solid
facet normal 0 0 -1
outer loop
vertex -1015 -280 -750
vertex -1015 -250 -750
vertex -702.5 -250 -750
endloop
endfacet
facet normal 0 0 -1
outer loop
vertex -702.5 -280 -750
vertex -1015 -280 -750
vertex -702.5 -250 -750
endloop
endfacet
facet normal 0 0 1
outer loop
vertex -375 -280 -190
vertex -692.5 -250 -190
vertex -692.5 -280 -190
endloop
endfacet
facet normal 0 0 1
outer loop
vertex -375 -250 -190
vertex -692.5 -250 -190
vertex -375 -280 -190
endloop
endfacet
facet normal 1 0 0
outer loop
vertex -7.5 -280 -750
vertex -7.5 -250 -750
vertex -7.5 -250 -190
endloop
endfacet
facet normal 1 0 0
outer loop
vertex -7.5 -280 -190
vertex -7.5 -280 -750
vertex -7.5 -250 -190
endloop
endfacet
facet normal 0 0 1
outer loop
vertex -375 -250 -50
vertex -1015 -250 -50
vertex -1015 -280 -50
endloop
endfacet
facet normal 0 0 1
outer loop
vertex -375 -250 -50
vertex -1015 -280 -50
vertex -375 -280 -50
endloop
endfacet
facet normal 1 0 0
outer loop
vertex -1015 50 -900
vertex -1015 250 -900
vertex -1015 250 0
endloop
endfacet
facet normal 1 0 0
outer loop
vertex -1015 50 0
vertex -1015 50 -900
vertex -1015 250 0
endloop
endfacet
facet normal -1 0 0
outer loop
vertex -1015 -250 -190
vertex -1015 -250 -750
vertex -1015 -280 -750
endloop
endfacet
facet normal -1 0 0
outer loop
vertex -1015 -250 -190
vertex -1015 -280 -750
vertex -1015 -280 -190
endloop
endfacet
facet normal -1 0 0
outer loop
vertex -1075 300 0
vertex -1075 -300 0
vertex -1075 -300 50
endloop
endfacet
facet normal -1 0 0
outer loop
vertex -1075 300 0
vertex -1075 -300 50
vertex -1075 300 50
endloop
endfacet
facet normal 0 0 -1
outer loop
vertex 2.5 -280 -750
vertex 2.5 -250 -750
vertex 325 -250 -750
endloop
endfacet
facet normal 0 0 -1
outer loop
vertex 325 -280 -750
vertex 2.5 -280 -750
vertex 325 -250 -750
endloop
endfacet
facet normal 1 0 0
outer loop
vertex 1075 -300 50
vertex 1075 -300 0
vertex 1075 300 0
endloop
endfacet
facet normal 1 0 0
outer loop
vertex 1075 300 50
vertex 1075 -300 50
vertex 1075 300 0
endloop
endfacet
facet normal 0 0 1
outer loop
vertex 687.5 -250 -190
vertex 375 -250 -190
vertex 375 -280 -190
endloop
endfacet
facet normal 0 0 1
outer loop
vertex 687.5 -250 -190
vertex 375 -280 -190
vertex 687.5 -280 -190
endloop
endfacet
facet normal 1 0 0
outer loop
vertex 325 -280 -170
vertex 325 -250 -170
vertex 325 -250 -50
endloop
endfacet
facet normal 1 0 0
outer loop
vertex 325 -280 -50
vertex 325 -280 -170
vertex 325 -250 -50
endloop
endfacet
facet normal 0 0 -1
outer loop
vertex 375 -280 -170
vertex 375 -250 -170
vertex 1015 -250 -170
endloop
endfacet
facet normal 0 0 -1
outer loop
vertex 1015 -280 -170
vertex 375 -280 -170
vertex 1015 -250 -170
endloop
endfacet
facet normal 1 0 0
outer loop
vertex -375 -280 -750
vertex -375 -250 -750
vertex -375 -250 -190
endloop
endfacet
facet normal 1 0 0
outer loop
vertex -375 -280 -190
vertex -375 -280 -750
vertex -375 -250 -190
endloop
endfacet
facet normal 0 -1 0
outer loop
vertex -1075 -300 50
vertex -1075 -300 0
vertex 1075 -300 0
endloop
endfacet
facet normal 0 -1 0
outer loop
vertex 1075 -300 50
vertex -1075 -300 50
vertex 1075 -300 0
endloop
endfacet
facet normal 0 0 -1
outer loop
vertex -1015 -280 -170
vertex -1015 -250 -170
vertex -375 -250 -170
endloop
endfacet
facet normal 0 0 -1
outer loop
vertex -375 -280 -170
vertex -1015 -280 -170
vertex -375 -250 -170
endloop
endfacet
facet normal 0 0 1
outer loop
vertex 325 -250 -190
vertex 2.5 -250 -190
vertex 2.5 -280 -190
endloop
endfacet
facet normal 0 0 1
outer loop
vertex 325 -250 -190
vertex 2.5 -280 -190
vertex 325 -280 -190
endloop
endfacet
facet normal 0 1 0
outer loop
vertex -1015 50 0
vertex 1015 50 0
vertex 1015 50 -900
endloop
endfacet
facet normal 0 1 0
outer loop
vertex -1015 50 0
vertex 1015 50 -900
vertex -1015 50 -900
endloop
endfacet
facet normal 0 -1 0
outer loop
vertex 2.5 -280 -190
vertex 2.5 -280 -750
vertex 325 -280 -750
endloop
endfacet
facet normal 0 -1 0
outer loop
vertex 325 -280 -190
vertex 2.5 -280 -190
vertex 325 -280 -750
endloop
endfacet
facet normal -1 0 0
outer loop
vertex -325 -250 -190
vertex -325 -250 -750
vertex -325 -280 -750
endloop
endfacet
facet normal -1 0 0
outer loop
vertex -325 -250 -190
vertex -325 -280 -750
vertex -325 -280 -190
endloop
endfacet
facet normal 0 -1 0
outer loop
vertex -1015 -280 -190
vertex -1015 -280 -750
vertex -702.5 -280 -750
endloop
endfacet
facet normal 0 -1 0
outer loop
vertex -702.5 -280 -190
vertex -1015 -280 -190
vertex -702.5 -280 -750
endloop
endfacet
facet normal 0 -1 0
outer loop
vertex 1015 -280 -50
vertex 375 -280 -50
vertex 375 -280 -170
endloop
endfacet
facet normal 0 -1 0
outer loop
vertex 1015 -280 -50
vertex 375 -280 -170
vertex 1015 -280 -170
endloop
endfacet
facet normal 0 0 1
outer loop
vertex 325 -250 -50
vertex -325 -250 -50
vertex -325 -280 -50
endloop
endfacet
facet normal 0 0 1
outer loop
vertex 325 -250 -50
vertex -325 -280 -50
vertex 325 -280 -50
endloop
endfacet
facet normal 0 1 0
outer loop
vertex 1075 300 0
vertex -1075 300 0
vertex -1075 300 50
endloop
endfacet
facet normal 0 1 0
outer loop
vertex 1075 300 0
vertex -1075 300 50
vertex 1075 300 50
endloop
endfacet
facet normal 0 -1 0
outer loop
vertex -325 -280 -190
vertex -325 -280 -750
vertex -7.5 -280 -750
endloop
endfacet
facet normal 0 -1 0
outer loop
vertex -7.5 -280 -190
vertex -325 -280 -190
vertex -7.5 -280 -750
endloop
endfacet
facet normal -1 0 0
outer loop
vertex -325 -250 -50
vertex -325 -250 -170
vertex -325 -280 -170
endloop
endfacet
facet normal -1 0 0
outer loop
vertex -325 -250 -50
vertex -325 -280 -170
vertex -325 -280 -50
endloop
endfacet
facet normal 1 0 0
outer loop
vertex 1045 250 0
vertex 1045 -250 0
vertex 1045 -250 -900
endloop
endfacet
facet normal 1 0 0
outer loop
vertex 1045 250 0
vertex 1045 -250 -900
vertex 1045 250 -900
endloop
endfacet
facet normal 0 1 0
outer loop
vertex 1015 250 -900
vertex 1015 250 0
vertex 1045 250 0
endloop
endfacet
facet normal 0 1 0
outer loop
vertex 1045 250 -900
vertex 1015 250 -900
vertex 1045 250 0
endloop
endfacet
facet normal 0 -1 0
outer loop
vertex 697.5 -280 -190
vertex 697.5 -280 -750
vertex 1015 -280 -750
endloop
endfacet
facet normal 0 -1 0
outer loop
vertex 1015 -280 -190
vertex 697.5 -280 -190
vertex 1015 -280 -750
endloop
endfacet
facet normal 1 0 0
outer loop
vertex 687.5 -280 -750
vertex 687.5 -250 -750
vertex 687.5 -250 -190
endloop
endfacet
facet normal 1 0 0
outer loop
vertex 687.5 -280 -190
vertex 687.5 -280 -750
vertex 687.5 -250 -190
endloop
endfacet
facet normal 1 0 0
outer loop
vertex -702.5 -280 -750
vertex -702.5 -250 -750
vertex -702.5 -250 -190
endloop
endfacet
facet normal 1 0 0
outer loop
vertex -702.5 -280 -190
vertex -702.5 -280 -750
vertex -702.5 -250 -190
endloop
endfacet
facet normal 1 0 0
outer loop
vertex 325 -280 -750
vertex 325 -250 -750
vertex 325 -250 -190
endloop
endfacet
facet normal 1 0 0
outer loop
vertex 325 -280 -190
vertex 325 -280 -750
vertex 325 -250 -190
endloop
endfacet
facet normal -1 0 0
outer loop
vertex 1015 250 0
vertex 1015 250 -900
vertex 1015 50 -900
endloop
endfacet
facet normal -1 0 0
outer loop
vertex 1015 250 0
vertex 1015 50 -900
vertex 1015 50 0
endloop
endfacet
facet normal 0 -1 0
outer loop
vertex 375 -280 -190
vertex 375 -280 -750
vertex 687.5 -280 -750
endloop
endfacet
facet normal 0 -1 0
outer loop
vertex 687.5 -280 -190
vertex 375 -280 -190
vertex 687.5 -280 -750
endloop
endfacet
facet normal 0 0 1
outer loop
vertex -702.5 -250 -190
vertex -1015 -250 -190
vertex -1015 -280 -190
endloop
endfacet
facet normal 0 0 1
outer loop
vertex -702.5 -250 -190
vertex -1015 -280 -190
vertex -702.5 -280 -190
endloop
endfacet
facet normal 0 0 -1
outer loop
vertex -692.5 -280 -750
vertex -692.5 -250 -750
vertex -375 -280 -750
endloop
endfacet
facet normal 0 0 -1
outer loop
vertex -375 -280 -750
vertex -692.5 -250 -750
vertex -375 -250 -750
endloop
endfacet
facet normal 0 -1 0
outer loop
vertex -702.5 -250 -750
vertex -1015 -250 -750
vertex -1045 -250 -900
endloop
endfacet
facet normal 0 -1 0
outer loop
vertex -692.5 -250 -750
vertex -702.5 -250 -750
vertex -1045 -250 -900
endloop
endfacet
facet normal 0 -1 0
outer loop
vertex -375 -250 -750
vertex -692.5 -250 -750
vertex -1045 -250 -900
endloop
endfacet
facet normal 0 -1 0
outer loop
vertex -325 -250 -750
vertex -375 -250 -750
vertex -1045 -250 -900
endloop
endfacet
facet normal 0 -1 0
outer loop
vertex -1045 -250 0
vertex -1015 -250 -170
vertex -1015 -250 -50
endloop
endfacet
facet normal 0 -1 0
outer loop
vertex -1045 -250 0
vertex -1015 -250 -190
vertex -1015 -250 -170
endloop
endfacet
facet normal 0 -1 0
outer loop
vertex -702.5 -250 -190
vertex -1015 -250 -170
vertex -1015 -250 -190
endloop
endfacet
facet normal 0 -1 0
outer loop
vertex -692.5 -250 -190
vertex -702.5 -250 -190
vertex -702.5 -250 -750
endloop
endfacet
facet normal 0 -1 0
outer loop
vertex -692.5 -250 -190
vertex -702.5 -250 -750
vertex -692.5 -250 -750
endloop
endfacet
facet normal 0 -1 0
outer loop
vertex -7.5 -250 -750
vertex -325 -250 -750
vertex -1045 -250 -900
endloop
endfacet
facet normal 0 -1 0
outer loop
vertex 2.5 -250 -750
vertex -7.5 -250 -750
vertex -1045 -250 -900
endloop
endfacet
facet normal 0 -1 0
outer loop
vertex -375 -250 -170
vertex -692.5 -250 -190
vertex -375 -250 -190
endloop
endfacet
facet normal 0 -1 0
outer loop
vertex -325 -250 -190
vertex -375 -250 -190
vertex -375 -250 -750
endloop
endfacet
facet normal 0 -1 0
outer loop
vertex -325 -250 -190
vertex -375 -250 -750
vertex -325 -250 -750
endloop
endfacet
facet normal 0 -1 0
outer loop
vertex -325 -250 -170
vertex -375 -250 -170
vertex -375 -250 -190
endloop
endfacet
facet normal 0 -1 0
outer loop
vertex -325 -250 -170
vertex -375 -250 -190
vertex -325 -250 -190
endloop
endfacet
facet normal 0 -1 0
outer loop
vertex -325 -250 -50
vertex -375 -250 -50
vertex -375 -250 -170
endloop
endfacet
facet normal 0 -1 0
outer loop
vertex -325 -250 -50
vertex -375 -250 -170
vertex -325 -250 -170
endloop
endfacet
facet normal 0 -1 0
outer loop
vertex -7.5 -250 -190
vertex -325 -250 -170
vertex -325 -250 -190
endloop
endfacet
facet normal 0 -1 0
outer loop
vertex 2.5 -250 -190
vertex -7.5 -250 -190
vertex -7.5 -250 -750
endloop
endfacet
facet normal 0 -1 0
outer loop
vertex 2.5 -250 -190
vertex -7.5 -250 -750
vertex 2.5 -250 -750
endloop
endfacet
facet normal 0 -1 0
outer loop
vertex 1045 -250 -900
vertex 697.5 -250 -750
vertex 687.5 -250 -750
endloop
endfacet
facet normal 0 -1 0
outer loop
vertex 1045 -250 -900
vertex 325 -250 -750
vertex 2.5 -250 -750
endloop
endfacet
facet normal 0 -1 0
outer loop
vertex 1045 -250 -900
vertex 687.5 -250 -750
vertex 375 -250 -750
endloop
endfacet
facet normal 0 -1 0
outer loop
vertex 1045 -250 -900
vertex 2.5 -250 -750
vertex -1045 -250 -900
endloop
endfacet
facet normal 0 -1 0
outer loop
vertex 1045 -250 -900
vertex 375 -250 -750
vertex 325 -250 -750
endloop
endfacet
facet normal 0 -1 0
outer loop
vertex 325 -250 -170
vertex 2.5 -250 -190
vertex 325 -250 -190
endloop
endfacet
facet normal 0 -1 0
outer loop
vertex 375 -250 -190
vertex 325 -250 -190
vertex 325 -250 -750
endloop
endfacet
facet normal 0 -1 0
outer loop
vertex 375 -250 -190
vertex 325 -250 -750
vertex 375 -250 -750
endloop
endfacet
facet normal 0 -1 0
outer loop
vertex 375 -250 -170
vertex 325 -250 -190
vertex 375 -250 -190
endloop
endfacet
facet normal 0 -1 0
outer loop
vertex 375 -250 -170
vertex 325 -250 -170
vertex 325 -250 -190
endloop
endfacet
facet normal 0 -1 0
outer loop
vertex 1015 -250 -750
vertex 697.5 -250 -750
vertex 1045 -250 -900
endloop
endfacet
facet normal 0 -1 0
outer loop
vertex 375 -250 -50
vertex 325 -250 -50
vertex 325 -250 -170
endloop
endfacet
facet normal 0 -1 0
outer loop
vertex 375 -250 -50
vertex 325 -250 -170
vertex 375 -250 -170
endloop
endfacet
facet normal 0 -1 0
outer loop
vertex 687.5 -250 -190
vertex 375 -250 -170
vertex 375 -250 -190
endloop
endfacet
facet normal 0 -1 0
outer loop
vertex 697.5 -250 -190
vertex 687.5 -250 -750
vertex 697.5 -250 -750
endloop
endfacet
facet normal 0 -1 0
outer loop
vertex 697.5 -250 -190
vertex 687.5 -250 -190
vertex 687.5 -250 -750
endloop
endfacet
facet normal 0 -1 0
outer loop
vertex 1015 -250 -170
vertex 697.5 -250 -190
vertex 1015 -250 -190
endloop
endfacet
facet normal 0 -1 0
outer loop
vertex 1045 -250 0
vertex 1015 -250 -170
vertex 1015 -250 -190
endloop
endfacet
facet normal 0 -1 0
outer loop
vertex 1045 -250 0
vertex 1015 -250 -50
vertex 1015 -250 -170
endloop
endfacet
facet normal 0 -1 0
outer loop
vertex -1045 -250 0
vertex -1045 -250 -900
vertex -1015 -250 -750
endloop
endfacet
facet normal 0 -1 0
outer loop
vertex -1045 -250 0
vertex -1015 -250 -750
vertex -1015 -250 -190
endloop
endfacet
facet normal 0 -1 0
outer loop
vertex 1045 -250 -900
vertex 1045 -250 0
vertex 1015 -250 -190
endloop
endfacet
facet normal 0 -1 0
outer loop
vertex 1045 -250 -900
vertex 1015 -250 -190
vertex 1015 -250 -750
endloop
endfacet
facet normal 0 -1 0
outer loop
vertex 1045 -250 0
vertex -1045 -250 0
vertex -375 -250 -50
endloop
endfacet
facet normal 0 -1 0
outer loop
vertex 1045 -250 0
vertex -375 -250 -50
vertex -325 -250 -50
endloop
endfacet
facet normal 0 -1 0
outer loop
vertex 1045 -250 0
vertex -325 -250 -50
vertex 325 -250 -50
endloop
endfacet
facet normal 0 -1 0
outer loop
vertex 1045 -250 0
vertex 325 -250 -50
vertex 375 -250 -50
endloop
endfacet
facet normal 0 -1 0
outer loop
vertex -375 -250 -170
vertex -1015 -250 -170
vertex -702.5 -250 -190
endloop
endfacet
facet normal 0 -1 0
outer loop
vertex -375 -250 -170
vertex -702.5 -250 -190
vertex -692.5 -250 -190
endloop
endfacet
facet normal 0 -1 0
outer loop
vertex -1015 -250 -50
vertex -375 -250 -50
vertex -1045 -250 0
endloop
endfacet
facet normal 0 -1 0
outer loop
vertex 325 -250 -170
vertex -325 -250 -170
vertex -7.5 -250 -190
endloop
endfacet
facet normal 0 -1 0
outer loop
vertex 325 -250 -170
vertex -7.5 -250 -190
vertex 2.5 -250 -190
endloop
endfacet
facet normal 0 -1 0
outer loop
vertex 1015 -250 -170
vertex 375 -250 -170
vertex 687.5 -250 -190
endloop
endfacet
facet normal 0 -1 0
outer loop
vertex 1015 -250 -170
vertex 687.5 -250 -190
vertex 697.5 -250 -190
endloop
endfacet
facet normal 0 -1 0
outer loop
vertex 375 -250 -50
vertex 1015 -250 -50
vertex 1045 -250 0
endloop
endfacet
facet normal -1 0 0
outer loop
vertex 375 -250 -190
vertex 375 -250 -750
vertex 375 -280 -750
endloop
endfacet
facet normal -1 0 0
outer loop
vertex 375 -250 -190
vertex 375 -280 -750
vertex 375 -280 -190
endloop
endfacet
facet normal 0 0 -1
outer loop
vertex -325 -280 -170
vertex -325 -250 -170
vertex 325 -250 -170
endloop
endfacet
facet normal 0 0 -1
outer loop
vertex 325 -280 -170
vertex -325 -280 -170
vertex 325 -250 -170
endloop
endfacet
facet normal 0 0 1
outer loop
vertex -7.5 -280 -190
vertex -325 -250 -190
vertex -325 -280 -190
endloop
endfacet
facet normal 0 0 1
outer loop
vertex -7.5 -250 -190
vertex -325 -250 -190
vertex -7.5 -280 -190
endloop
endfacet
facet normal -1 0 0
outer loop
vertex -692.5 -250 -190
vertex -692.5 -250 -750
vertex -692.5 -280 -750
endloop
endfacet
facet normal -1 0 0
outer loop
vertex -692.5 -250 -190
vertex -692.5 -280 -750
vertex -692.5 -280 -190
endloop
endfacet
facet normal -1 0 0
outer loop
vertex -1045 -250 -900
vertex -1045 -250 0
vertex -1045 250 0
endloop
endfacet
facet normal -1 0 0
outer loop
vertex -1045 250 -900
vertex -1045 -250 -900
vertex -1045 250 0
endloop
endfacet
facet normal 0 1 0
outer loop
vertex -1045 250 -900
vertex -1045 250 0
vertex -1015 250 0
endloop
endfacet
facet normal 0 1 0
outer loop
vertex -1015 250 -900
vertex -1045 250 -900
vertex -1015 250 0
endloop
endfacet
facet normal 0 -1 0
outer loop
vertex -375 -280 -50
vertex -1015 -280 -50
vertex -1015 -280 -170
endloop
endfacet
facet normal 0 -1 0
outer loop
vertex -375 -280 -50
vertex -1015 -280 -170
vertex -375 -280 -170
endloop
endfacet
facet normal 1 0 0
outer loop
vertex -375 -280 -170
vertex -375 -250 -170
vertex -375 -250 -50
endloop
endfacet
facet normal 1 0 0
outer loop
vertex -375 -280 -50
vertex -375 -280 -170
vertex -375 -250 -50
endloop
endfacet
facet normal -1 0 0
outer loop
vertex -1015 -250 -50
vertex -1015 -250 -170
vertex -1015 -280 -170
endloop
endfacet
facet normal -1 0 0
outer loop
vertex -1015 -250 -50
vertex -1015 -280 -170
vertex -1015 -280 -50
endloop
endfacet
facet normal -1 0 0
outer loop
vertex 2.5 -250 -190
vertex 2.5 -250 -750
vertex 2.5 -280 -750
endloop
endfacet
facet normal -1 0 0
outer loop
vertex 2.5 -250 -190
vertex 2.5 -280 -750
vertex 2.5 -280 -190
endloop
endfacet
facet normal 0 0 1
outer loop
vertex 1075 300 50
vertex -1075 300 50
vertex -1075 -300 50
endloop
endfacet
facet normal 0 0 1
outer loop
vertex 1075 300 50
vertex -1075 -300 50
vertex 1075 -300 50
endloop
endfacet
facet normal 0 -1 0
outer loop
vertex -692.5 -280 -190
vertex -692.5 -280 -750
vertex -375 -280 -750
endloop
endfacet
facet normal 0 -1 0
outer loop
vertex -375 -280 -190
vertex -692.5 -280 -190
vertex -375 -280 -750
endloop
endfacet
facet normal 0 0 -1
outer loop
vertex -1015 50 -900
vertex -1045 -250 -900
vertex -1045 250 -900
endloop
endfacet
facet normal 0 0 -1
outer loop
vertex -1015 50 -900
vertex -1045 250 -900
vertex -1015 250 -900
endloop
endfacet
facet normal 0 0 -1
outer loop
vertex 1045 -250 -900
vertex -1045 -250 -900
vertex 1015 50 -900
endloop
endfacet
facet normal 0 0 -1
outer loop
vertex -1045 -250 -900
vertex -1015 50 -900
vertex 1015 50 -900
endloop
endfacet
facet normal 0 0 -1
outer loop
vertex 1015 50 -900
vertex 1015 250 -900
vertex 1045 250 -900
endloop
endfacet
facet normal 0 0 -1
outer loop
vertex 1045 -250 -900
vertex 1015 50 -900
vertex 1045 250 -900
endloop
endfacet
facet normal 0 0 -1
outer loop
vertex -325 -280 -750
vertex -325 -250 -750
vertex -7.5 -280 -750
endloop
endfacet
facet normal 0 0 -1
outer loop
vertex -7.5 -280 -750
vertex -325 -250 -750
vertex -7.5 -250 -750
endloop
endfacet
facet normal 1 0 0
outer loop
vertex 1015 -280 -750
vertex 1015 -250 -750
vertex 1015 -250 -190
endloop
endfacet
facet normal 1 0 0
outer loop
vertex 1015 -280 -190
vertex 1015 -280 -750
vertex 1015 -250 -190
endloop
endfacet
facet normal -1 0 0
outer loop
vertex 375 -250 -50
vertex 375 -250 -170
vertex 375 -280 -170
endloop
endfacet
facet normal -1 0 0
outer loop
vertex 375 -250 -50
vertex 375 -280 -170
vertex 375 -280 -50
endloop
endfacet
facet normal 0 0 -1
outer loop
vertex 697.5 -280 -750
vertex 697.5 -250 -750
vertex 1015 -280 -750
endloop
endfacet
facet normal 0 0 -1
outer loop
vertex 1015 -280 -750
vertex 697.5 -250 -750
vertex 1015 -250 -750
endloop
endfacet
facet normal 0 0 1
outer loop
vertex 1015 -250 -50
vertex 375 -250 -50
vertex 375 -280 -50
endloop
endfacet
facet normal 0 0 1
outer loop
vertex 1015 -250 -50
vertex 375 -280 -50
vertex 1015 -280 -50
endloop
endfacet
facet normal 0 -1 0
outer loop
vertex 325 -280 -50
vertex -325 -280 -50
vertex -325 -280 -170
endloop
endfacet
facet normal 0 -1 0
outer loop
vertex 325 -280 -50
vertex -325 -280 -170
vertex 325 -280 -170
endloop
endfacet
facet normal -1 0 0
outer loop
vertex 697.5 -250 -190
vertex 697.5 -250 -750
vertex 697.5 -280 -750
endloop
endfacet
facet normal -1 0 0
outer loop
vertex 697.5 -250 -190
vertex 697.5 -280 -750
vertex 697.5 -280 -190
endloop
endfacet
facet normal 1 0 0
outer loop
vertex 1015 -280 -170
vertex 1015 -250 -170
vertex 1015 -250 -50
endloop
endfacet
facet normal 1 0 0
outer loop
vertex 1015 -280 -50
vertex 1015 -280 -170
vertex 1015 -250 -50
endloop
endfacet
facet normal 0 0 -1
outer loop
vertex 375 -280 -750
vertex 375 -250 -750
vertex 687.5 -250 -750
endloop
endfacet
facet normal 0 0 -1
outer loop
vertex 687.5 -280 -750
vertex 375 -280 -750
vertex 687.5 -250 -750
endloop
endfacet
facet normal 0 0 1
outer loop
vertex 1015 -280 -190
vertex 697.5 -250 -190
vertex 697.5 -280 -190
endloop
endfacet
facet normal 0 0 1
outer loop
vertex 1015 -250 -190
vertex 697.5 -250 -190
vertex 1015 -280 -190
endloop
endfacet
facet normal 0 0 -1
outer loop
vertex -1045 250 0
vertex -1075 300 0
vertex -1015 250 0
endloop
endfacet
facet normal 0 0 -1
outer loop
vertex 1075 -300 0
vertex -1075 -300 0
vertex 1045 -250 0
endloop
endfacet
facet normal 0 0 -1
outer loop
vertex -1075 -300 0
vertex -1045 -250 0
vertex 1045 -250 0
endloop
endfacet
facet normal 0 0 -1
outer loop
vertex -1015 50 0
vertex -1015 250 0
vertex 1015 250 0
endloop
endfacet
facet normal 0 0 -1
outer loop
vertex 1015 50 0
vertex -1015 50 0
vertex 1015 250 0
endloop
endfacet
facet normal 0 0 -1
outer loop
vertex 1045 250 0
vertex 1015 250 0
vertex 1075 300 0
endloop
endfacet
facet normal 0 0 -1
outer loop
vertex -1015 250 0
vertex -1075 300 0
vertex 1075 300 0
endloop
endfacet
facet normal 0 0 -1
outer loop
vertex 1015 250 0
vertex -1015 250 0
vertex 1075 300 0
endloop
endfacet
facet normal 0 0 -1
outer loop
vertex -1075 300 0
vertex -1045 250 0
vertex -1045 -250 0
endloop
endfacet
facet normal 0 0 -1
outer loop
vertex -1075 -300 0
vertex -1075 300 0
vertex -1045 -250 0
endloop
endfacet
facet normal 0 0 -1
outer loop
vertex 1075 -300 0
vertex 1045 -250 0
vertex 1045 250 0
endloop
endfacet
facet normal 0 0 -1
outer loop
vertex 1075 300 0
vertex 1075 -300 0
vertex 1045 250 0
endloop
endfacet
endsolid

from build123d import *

# Parameters (mm, degrees)
F0_W     = 2150
F0_H     = 600
F1_DEPTH = 50
F2_W     = 2090
F2_H     = 500
F3_DEPTH = 900
F4_W     = 640
F4_H     = 120
F4_W_2   = 650
F4_W_3   = 312.5
F4_H_2   = 560
F4_W_4   = 317.5
F4_W_5   = 322.5
F5_DEPTH = 30
F6_W     = 2030
F6_H     = 900
F7_DEPTH = 200


with BuildPart() as f1:
    # F0 (on Top) → F1 (new body)
    with BuildSketch(Plane.XY):
        Rectangle(F0_W, F0_H)
    extrude(amount=F1_DEPTH)

    # F2 (on Top) → F3 (join)
    with BuildSketch(Plane.XY):
        Rectangle(F2_W, F2_H)
    extrude(amount=-F3_DEPTH)

    # F4 (on face) → F5 (join)
    with BuildSketch(Plane.XZ.offset(250)):
        with Locations((-695, -110)):
            Rectangle(F4_W, F4_H)
        with Locations((0, -110)):
            Rectangle(F4_W_2, F4_H)
        with Locations((695, -110)):
            Rectangle(F4_W, F4_H)
        with Locations((-858.75, -470)):
            Rectangle(F4_W_3, F4_H_2)
        with Locations((-533.75, -470)):
            Rectangle(F4_W_4, F4_H_2)
        with Locations((-166.25, -470)):
            Rectangle(F4_W_4, F4_H_2)
        with Locations((163.75, -470)):
            Rectangle(F4_W_5, F4_H_2)
        with Locations((531.25, -470)):
            Rectangle(F4_W_3, F4_H_2)
        with Locations((856.25, -470)):
            Rectangle(F4_W_4, F4_H_2)
    extrude(amount=F5_DEPTH)

    # F6 (on face) → F7 (cut)
    with BuildSketch(Plane(origin=(0, 250, 0), x_dir=(-1, 0, 0), z_dir=(0, 1, 0))):
        with Locations((0, -450)):
            Rectangle(F6_W, F6_H)
    extrude(amount=-F7_DEPTH, mode=Mode.SUBTRACT)


solid = f1.part
